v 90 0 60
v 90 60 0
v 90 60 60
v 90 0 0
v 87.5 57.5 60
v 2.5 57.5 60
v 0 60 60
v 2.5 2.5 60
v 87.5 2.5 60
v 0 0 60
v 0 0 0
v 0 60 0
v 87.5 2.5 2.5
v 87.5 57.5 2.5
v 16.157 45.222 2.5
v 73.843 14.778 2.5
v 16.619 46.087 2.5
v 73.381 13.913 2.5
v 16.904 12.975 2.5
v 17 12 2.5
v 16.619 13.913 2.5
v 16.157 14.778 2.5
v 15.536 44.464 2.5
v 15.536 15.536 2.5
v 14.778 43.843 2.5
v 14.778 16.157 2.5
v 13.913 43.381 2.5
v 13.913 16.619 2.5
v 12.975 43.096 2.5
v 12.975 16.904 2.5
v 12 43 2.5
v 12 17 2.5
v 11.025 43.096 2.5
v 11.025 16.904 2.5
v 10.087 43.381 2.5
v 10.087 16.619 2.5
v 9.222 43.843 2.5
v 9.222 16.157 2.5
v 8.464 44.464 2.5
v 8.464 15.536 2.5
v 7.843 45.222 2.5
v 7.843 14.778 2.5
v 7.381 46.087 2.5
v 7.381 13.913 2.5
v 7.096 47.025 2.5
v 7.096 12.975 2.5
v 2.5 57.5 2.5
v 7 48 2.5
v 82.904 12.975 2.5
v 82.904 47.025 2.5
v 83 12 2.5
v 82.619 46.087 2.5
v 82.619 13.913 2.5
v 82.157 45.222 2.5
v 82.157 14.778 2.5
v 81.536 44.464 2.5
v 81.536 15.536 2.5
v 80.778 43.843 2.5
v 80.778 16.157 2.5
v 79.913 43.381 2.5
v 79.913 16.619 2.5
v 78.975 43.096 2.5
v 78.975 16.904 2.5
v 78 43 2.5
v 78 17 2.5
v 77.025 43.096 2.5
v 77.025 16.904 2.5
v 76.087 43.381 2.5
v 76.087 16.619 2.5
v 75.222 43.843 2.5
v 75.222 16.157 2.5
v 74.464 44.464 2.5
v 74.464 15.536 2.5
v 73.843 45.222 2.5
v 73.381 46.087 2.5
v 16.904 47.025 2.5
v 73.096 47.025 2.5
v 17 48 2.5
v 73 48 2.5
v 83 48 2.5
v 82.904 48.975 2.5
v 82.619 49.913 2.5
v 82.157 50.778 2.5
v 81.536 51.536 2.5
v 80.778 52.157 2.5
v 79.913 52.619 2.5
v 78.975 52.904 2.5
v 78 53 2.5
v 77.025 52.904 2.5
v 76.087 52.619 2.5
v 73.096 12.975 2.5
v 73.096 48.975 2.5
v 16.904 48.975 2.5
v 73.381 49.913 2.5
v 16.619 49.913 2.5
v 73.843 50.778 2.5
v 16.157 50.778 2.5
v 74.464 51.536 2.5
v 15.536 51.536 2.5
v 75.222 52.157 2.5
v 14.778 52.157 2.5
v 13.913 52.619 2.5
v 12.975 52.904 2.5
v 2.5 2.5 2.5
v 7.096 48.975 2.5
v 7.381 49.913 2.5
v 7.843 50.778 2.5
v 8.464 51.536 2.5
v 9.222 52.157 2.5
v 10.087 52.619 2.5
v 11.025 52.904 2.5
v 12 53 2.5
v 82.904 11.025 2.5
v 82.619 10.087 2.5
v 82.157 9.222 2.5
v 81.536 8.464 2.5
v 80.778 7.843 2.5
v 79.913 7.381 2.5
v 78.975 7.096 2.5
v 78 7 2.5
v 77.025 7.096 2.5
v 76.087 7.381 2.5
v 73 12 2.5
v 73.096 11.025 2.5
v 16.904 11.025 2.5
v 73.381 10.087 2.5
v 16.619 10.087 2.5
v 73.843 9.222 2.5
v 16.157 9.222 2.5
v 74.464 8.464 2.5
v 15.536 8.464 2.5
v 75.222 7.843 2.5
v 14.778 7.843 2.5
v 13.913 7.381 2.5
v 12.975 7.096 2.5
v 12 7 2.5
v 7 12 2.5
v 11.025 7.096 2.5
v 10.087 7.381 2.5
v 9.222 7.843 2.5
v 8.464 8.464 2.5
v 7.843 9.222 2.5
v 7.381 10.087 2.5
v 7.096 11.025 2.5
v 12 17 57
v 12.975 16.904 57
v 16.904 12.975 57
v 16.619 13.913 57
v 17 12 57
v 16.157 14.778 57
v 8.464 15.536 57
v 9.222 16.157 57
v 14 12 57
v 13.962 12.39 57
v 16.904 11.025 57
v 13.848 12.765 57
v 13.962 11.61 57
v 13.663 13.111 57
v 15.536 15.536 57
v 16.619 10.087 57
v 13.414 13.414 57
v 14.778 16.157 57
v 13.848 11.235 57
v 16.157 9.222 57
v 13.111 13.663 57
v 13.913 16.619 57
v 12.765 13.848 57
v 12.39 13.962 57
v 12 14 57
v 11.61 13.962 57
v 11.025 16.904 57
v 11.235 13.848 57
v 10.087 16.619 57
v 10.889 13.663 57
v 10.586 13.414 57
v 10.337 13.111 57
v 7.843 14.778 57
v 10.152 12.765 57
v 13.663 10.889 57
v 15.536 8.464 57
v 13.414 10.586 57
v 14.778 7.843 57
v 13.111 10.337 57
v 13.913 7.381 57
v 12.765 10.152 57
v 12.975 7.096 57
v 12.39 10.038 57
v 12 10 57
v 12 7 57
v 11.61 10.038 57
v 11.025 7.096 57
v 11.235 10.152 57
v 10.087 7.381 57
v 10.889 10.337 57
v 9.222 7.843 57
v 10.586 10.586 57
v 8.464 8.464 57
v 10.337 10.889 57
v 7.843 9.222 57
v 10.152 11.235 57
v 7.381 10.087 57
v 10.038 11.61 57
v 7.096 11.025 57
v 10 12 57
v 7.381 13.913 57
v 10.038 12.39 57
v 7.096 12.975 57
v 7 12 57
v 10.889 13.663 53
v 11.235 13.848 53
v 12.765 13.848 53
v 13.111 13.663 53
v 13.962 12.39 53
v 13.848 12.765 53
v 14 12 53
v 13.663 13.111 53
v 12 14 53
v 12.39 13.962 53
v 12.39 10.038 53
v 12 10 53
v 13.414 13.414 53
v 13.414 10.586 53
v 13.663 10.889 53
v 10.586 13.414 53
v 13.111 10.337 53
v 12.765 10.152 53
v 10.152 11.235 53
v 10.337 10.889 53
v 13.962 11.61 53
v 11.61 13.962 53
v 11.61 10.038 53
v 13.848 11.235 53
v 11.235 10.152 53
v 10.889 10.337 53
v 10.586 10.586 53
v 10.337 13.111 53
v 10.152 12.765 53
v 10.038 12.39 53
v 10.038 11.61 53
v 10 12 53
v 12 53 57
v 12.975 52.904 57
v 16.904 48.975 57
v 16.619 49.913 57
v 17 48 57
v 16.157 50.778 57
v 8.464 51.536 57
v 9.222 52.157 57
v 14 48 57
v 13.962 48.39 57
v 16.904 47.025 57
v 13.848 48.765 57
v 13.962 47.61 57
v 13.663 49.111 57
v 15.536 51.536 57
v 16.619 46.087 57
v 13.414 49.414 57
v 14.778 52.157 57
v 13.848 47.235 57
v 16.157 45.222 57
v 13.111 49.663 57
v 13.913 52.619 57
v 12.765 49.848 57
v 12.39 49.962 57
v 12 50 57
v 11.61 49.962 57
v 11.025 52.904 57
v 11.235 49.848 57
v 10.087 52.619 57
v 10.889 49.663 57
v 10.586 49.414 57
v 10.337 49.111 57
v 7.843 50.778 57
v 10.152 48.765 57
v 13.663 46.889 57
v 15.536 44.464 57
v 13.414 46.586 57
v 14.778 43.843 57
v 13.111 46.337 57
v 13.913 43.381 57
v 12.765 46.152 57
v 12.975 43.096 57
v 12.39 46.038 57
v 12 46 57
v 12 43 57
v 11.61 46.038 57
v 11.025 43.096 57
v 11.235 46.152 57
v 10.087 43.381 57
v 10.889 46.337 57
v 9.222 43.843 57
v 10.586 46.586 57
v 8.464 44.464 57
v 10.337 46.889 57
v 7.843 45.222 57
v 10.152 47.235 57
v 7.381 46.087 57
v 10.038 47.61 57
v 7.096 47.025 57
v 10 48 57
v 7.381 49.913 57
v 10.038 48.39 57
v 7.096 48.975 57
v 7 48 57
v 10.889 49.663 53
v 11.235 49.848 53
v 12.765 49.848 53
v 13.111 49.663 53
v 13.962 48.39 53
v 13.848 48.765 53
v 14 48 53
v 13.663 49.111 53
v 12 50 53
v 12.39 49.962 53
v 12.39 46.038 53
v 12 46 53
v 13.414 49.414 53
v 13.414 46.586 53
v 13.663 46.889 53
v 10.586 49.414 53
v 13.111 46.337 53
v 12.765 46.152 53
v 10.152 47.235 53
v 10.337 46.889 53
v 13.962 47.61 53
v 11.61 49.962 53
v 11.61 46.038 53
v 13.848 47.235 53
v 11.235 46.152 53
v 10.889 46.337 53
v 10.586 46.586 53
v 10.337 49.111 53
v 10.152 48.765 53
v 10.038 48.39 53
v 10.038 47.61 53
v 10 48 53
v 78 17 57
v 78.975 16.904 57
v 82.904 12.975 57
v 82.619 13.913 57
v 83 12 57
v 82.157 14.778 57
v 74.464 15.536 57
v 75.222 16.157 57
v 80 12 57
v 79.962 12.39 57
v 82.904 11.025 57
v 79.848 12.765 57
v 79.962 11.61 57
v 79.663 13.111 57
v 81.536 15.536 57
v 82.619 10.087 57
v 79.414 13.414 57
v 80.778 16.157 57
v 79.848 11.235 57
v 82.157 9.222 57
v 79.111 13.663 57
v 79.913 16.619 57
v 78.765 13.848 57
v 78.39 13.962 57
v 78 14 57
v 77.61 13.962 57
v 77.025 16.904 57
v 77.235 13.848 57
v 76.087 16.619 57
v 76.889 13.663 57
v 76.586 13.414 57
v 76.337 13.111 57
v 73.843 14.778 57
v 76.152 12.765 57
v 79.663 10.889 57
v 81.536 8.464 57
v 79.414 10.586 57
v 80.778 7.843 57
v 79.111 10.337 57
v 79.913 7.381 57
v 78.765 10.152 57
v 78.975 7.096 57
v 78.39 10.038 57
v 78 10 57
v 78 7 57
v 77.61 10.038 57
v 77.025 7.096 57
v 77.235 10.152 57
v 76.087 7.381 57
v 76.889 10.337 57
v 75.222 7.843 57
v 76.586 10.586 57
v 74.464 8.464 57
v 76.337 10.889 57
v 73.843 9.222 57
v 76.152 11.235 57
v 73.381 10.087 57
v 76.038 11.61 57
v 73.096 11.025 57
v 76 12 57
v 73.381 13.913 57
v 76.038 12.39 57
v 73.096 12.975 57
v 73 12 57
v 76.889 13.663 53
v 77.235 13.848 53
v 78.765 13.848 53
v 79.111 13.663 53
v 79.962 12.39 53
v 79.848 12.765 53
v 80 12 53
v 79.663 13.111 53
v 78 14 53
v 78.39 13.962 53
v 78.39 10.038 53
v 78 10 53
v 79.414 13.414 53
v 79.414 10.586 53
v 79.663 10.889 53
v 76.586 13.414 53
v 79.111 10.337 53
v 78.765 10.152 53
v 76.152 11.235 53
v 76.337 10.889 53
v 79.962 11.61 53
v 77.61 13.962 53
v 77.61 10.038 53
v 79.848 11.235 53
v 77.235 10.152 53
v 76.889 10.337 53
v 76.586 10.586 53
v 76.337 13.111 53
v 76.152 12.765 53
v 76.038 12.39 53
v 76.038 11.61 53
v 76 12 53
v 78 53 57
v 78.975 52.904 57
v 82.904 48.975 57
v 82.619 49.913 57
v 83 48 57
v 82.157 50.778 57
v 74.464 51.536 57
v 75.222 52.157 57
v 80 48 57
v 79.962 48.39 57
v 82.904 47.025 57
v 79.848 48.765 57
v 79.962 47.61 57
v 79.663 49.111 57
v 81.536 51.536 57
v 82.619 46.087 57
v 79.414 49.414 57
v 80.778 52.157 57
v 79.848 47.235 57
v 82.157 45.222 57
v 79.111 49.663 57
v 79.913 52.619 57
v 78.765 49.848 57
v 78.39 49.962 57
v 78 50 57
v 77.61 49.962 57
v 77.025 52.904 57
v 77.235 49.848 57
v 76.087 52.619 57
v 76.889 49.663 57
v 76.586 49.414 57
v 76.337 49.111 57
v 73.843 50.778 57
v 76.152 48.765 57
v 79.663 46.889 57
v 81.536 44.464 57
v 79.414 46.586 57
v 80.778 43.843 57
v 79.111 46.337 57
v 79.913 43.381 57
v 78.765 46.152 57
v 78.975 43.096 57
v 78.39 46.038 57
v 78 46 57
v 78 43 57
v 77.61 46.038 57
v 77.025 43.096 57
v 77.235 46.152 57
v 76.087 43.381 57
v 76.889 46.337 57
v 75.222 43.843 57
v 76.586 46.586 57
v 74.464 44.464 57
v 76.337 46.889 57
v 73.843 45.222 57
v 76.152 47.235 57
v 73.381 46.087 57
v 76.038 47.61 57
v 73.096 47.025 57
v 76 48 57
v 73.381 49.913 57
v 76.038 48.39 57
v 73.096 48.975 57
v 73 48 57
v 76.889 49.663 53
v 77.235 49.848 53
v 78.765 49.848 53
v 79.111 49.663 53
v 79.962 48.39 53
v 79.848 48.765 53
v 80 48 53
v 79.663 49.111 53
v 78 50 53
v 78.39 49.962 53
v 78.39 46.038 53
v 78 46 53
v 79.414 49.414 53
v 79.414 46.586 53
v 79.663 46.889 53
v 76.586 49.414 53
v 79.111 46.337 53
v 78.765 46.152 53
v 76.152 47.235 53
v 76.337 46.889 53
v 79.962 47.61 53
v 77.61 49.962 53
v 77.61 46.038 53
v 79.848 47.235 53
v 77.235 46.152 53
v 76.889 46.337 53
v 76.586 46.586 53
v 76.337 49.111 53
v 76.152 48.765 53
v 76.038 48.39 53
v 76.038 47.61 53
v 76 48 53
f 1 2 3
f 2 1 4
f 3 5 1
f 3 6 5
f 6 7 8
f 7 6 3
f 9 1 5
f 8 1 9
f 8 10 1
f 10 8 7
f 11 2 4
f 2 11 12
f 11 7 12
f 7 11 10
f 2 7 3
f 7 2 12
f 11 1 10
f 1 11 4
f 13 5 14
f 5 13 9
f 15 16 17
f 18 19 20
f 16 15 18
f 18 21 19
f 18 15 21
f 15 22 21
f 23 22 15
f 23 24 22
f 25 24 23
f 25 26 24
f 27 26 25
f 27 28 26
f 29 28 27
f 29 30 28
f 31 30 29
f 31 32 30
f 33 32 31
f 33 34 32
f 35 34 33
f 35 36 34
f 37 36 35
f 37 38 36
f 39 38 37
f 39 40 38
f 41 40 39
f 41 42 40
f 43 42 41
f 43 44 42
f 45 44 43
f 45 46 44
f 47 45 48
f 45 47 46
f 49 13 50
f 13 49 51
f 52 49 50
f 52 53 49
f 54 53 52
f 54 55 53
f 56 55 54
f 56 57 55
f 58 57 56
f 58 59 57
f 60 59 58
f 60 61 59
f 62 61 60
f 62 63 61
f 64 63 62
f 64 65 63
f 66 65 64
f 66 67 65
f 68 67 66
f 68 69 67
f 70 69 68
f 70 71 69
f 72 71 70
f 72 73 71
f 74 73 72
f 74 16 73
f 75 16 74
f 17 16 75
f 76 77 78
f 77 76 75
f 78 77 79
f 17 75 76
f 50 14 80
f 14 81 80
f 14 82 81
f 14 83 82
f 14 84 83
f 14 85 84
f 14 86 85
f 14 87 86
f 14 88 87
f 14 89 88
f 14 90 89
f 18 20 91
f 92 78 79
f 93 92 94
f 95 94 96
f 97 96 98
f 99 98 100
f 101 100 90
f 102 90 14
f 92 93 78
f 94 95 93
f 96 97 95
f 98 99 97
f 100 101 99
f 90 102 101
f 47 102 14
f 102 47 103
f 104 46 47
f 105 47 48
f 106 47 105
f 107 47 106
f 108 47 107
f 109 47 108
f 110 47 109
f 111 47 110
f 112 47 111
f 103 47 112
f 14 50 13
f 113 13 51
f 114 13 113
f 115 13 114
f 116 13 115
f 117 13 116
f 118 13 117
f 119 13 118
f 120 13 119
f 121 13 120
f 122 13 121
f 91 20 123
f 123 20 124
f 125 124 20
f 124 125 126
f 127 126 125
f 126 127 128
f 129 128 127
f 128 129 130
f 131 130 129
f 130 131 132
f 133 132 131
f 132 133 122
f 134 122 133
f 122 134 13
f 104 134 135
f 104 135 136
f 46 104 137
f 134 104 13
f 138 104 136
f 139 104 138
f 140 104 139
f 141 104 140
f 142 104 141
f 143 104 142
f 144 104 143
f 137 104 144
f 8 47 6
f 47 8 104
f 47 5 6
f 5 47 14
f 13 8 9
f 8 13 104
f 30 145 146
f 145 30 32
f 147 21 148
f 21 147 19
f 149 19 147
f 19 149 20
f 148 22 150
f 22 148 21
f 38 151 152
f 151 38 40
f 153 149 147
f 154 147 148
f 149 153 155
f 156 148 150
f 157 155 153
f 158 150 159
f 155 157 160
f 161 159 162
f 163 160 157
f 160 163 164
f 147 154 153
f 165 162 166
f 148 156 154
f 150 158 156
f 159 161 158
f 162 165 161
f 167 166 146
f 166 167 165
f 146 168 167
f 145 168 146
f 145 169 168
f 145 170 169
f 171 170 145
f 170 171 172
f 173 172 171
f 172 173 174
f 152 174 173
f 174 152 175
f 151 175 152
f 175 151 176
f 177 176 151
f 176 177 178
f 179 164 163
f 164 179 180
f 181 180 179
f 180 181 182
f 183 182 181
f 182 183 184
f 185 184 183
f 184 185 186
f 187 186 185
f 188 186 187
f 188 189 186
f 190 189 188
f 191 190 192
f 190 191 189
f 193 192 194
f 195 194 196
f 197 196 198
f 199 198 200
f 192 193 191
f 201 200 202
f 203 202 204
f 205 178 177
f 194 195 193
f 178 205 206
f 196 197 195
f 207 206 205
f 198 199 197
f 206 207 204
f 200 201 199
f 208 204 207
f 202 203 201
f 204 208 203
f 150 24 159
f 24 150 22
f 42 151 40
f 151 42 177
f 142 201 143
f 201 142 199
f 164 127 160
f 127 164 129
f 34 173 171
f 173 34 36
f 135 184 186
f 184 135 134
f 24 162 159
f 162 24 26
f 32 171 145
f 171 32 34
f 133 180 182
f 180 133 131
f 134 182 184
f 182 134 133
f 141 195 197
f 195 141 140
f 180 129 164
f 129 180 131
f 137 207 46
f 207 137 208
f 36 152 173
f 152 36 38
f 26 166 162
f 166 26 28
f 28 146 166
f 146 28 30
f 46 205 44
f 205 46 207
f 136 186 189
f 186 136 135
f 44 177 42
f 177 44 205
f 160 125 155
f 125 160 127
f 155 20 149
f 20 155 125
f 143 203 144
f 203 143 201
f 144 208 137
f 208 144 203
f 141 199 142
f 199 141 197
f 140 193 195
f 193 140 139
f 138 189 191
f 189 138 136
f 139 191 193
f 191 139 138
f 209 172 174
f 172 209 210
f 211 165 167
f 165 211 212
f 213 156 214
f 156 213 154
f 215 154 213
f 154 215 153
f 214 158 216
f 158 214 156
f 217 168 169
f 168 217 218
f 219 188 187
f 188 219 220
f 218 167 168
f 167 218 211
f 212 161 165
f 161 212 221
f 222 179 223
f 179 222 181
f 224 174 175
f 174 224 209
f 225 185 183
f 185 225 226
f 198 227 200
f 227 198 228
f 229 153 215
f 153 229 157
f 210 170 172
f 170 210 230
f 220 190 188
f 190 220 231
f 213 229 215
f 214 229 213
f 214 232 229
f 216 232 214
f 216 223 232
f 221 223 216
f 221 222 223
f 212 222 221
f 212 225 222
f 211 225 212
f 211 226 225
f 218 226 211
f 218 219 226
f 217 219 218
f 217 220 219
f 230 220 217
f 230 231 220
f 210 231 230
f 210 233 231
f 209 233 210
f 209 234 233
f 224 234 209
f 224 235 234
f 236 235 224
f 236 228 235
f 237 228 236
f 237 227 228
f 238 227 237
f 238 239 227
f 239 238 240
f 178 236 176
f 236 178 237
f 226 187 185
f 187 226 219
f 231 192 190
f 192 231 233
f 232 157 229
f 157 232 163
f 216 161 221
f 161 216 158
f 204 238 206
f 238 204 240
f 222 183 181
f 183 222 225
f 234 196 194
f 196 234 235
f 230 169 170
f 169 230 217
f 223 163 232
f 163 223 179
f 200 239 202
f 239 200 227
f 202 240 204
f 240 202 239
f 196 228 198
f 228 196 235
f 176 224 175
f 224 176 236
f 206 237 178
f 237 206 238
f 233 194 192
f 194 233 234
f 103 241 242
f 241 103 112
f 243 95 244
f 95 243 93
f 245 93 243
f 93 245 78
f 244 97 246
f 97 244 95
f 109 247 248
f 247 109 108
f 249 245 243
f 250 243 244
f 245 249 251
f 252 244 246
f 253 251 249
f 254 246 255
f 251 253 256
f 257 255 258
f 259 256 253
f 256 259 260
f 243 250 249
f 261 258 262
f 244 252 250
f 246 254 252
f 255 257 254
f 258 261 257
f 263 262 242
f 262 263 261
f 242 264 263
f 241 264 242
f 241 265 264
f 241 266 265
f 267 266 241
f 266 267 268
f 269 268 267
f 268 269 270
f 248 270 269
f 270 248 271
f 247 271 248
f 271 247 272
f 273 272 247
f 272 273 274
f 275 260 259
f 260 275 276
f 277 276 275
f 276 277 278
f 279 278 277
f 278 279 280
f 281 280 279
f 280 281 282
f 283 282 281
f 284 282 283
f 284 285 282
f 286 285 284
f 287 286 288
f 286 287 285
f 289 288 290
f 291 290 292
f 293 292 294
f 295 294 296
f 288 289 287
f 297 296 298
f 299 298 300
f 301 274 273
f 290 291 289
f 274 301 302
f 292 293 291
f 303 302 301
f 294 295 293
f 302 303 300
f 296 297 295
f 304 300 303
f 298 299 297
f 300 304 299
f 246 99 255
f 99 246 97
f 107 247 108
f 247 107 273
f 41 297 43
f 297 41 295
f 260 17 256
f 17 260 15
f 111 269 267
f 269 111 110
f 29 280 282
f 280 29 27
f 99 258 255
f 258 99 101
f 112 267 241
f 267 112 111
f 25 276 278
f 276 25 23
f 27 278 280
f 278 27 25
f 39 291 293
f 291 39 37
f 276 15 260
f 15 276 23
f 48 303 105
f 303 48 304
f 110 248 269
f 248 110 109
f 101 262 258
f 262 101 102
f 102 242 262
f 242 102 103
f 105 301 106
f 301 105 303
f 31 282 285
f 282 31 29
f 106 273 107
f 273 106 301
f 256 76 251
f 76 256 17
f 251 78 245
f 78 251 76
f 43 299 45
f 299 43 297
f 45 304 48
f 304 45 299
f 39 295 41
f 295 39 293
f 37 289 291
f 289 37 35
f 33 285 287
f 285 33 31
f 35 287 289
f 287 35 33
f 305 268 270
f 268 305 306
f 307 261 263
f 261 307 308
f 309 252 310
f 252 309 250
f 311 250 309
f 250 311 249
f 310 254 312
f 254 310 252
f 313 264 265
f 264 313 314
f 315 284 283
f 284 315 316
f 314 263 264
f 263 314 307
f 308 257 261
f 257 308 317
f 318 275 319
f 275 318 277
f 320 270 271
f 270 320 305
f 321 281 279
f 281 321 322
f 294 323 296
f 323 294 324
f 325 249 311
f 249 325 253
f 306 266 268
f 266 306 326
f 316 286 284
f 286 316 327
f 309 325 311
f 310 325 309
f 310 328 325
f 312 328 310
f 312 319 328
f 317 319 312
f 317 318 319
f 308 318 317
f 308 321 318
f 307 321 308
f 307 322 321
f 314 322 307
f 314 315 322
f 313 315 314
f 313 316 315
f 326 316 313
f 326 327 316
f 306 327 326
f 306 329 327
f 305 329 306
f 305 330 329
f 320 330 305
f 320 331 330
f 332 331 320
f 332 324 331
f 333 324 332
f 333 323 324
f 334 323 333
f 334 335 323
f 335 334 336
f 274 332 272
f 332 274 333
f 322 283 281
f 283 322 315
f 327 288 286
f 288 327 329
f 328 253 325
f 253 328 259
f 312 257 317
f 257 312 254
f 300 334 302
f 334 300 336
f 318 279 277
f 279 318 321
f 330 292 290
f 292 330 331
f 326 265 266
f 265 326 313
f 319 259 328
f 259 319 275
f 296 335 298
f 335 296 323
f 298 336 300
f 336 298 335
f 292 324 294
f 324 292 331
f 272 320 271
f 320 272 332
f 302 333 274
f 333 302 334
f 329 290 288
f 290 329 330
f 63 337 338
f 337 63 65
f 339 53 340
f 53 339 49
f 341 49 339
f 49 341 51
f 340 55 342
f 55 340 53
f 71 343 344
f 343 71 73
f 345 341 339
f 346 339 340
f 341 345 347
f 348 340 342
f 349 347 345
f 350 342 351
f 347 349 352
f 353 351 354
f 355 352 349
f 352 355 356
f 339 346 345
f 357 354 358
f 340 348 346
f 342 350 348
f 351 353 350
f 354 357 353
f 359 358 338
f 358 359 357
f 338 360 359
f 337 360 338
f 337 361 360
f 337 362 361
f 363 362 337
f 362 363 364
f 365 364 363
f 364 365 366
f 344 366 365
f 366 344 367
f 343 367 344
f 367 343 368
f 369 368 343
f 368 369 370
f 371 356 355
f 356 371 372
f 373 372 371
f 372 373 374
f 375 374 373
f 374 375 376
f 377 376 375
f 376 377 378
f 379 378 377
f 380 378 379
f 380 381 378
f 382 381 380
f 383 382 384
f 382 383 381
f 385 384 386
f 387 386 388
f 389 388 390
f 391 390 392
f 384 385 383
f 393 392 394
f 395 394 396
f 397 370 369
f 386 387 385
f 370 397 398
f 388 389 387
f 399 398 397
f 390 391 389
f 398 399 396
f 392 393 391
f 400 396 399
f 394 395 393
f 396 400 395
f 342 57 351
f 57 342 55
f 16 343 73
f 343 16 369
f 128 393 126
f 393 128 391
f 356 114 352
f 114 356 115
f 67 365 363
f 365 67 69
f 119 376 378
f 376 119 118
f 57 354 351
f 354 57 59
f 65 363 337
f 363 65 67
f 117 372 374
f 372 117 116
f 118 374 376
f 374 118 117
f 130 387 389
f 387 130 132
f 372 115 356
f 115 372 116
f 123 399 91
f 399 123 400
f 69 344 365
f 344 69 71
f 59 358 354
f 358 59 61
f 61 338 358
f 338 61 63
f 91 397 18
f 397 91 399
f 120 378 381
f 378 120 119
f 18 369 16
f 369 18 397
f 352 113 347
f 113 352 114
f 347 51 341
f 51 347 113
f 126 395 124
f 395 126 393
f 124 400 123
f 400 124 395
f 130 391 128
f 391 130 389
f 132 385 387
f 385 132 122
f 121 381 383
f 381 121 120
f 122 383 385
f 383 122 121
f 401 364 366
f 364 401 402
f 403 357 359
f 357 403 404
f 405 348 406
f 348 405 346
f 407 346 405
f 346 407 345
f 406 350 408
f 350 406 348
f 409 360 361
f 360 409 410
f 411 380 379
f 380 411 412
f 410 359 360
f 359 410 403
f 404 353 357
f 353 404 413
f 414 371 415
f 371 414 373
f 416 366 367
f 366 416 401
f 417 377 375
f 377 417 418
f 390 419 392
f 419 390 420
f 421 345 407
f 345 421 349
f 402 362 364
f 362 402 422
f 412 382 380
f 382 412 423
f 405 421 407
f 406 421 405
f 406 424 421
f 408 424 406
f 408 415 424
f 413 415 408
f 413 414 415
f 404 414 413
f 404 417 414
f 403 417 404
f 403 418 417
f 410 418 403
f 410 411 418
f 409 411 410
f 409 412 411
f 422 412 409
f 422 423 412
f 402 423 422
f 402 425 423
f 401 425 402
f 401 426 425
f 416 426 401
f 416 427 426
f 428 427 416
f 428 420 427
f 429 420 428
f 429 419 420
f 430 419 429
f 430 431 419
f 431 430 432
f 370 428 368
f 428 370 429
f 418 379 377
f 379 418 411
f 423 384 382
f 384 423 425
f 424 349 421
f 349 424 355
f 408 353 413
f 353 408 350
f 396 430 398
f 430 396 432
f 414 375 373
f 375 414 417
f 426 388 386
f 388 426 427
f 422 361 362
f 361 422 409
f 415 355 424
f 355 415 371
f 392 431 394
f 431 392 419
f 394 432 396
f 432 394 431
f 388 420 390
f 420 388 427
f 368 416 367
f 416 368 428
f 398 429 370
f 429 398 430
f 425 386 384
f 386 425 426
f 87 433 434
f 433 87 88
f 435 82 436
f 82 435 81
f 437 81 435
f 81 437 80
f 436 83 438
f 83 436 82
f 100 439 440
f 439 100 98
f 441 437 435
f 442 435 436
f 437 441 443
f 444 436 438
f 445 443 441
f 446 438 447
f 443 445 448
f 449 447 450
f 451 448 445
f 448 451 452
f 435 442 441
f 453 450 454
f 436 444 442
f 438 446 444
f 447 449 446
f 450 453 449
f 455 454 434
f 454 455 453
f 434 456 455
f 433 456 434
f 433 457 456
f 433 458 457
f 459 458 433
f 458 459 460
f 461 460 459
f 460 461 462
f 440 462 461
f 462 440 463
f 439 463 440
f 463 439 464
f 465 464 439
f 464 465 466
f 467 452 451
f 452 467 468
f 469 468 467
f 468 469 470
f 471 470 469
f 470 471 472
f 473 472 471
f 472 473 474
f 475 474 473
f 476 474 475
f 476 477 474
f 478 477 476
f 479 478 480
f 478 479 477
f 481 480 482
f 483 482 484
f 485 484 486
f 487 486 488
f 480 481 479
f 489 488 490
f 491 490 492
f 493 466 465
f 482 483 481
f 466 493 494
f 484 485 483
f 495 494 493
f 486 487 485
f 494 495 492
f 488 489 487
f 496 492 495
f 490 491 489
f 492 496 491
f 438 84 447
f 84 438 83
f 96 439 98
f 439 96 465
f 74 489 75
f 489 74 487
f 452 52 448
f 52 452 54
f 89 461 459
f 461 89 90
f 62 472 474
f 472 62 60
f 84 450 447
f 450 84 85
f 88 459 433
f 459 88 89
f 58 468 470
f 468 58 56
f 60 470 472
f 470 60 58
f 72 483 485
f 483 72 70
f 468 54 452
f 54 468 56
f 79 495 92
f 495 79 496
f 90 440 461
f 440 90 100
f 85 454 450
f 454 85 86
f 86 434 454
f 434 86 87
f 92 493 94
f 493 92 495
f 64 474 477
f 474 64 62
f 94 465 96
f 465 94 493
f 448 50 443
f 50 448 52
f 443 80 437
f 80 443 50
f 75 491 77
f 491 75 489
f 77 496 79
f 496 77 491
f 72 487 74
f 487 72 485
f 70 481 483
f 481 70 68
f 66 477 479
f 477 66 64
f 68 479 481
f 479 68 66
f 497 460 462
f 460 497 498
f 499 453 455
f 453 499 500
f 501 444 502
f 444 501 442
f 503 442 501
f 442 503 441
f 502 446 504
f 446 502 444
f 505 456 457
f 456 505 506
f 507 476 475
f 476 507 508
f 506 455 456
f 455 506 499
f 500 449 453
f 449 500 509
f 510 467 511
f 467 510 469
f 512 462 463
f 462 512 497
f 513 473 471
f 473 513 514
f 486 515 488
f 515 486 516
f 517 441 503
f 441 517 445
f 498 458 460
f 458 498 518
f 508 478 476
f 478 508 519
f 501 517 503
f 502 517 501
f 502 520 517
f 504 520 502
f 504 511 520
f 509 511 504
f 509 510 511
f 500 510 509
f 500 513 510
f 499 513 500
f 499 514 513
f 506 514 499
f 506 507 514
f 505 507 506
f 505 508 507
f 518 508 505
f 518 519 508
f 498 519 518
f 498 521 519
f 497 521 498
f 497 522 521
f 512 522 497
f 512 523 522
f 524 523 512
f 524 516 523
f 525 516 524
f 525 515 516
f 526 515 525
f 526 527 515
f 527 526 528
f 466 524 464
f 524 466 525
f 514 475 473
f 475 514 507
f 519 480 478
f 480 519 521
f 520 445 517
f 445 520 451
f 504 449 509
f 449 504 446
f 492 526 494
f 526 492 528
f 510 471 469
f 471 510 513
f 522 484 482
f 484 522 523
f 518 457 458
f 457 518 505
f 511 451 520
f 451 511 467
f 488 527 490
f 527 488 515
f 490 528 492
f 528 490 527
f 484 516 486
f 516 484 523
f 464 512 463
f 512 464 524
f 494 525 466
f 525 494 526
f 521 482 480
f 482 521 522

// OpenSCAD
$fn = 32;

// ----------------------------------------------------------------------
// Enclosure box: bosses enclosure
// ----------------------------------------------------------------------

// --- parameters (mm) ---
box_l = 90;               // outer length, X
box_w = 60;               // outer width, Y
box_h = 60;               // outer height
wall_t = 2.5;             // wall thickness
boss_r = 5;               // corner boss radius
hole_r = 2;               // boss screw hole radius
boss_in = 12;             // boss inset from the corners

inner_h = box_h - wall_t;  // cavity depth
boss_h = inner_h - 2;  // corner boss height

difference() {
  union() {
    difference() {
      cube([box_l, box_w, box_h]);
      translate([wall_t, wall_t, wall_t])
        cube([box_l - 2 * wall_t, box_w - 2 * wall_t, box_h]);
    }
    for (sx = [0, 1], sy = [0, 1])
      translate([sx ? box_l - boss_in : boss_in,
                 sy ? box_w - boss_in : boss_in, wall_t - 1])
        difference() {
          cylinder(r = boss_r, h = boss_h);
          translate([0, 0, boss_h - 4])
            cylinder(r = hole_r, h = 5);
        }
  }
}
